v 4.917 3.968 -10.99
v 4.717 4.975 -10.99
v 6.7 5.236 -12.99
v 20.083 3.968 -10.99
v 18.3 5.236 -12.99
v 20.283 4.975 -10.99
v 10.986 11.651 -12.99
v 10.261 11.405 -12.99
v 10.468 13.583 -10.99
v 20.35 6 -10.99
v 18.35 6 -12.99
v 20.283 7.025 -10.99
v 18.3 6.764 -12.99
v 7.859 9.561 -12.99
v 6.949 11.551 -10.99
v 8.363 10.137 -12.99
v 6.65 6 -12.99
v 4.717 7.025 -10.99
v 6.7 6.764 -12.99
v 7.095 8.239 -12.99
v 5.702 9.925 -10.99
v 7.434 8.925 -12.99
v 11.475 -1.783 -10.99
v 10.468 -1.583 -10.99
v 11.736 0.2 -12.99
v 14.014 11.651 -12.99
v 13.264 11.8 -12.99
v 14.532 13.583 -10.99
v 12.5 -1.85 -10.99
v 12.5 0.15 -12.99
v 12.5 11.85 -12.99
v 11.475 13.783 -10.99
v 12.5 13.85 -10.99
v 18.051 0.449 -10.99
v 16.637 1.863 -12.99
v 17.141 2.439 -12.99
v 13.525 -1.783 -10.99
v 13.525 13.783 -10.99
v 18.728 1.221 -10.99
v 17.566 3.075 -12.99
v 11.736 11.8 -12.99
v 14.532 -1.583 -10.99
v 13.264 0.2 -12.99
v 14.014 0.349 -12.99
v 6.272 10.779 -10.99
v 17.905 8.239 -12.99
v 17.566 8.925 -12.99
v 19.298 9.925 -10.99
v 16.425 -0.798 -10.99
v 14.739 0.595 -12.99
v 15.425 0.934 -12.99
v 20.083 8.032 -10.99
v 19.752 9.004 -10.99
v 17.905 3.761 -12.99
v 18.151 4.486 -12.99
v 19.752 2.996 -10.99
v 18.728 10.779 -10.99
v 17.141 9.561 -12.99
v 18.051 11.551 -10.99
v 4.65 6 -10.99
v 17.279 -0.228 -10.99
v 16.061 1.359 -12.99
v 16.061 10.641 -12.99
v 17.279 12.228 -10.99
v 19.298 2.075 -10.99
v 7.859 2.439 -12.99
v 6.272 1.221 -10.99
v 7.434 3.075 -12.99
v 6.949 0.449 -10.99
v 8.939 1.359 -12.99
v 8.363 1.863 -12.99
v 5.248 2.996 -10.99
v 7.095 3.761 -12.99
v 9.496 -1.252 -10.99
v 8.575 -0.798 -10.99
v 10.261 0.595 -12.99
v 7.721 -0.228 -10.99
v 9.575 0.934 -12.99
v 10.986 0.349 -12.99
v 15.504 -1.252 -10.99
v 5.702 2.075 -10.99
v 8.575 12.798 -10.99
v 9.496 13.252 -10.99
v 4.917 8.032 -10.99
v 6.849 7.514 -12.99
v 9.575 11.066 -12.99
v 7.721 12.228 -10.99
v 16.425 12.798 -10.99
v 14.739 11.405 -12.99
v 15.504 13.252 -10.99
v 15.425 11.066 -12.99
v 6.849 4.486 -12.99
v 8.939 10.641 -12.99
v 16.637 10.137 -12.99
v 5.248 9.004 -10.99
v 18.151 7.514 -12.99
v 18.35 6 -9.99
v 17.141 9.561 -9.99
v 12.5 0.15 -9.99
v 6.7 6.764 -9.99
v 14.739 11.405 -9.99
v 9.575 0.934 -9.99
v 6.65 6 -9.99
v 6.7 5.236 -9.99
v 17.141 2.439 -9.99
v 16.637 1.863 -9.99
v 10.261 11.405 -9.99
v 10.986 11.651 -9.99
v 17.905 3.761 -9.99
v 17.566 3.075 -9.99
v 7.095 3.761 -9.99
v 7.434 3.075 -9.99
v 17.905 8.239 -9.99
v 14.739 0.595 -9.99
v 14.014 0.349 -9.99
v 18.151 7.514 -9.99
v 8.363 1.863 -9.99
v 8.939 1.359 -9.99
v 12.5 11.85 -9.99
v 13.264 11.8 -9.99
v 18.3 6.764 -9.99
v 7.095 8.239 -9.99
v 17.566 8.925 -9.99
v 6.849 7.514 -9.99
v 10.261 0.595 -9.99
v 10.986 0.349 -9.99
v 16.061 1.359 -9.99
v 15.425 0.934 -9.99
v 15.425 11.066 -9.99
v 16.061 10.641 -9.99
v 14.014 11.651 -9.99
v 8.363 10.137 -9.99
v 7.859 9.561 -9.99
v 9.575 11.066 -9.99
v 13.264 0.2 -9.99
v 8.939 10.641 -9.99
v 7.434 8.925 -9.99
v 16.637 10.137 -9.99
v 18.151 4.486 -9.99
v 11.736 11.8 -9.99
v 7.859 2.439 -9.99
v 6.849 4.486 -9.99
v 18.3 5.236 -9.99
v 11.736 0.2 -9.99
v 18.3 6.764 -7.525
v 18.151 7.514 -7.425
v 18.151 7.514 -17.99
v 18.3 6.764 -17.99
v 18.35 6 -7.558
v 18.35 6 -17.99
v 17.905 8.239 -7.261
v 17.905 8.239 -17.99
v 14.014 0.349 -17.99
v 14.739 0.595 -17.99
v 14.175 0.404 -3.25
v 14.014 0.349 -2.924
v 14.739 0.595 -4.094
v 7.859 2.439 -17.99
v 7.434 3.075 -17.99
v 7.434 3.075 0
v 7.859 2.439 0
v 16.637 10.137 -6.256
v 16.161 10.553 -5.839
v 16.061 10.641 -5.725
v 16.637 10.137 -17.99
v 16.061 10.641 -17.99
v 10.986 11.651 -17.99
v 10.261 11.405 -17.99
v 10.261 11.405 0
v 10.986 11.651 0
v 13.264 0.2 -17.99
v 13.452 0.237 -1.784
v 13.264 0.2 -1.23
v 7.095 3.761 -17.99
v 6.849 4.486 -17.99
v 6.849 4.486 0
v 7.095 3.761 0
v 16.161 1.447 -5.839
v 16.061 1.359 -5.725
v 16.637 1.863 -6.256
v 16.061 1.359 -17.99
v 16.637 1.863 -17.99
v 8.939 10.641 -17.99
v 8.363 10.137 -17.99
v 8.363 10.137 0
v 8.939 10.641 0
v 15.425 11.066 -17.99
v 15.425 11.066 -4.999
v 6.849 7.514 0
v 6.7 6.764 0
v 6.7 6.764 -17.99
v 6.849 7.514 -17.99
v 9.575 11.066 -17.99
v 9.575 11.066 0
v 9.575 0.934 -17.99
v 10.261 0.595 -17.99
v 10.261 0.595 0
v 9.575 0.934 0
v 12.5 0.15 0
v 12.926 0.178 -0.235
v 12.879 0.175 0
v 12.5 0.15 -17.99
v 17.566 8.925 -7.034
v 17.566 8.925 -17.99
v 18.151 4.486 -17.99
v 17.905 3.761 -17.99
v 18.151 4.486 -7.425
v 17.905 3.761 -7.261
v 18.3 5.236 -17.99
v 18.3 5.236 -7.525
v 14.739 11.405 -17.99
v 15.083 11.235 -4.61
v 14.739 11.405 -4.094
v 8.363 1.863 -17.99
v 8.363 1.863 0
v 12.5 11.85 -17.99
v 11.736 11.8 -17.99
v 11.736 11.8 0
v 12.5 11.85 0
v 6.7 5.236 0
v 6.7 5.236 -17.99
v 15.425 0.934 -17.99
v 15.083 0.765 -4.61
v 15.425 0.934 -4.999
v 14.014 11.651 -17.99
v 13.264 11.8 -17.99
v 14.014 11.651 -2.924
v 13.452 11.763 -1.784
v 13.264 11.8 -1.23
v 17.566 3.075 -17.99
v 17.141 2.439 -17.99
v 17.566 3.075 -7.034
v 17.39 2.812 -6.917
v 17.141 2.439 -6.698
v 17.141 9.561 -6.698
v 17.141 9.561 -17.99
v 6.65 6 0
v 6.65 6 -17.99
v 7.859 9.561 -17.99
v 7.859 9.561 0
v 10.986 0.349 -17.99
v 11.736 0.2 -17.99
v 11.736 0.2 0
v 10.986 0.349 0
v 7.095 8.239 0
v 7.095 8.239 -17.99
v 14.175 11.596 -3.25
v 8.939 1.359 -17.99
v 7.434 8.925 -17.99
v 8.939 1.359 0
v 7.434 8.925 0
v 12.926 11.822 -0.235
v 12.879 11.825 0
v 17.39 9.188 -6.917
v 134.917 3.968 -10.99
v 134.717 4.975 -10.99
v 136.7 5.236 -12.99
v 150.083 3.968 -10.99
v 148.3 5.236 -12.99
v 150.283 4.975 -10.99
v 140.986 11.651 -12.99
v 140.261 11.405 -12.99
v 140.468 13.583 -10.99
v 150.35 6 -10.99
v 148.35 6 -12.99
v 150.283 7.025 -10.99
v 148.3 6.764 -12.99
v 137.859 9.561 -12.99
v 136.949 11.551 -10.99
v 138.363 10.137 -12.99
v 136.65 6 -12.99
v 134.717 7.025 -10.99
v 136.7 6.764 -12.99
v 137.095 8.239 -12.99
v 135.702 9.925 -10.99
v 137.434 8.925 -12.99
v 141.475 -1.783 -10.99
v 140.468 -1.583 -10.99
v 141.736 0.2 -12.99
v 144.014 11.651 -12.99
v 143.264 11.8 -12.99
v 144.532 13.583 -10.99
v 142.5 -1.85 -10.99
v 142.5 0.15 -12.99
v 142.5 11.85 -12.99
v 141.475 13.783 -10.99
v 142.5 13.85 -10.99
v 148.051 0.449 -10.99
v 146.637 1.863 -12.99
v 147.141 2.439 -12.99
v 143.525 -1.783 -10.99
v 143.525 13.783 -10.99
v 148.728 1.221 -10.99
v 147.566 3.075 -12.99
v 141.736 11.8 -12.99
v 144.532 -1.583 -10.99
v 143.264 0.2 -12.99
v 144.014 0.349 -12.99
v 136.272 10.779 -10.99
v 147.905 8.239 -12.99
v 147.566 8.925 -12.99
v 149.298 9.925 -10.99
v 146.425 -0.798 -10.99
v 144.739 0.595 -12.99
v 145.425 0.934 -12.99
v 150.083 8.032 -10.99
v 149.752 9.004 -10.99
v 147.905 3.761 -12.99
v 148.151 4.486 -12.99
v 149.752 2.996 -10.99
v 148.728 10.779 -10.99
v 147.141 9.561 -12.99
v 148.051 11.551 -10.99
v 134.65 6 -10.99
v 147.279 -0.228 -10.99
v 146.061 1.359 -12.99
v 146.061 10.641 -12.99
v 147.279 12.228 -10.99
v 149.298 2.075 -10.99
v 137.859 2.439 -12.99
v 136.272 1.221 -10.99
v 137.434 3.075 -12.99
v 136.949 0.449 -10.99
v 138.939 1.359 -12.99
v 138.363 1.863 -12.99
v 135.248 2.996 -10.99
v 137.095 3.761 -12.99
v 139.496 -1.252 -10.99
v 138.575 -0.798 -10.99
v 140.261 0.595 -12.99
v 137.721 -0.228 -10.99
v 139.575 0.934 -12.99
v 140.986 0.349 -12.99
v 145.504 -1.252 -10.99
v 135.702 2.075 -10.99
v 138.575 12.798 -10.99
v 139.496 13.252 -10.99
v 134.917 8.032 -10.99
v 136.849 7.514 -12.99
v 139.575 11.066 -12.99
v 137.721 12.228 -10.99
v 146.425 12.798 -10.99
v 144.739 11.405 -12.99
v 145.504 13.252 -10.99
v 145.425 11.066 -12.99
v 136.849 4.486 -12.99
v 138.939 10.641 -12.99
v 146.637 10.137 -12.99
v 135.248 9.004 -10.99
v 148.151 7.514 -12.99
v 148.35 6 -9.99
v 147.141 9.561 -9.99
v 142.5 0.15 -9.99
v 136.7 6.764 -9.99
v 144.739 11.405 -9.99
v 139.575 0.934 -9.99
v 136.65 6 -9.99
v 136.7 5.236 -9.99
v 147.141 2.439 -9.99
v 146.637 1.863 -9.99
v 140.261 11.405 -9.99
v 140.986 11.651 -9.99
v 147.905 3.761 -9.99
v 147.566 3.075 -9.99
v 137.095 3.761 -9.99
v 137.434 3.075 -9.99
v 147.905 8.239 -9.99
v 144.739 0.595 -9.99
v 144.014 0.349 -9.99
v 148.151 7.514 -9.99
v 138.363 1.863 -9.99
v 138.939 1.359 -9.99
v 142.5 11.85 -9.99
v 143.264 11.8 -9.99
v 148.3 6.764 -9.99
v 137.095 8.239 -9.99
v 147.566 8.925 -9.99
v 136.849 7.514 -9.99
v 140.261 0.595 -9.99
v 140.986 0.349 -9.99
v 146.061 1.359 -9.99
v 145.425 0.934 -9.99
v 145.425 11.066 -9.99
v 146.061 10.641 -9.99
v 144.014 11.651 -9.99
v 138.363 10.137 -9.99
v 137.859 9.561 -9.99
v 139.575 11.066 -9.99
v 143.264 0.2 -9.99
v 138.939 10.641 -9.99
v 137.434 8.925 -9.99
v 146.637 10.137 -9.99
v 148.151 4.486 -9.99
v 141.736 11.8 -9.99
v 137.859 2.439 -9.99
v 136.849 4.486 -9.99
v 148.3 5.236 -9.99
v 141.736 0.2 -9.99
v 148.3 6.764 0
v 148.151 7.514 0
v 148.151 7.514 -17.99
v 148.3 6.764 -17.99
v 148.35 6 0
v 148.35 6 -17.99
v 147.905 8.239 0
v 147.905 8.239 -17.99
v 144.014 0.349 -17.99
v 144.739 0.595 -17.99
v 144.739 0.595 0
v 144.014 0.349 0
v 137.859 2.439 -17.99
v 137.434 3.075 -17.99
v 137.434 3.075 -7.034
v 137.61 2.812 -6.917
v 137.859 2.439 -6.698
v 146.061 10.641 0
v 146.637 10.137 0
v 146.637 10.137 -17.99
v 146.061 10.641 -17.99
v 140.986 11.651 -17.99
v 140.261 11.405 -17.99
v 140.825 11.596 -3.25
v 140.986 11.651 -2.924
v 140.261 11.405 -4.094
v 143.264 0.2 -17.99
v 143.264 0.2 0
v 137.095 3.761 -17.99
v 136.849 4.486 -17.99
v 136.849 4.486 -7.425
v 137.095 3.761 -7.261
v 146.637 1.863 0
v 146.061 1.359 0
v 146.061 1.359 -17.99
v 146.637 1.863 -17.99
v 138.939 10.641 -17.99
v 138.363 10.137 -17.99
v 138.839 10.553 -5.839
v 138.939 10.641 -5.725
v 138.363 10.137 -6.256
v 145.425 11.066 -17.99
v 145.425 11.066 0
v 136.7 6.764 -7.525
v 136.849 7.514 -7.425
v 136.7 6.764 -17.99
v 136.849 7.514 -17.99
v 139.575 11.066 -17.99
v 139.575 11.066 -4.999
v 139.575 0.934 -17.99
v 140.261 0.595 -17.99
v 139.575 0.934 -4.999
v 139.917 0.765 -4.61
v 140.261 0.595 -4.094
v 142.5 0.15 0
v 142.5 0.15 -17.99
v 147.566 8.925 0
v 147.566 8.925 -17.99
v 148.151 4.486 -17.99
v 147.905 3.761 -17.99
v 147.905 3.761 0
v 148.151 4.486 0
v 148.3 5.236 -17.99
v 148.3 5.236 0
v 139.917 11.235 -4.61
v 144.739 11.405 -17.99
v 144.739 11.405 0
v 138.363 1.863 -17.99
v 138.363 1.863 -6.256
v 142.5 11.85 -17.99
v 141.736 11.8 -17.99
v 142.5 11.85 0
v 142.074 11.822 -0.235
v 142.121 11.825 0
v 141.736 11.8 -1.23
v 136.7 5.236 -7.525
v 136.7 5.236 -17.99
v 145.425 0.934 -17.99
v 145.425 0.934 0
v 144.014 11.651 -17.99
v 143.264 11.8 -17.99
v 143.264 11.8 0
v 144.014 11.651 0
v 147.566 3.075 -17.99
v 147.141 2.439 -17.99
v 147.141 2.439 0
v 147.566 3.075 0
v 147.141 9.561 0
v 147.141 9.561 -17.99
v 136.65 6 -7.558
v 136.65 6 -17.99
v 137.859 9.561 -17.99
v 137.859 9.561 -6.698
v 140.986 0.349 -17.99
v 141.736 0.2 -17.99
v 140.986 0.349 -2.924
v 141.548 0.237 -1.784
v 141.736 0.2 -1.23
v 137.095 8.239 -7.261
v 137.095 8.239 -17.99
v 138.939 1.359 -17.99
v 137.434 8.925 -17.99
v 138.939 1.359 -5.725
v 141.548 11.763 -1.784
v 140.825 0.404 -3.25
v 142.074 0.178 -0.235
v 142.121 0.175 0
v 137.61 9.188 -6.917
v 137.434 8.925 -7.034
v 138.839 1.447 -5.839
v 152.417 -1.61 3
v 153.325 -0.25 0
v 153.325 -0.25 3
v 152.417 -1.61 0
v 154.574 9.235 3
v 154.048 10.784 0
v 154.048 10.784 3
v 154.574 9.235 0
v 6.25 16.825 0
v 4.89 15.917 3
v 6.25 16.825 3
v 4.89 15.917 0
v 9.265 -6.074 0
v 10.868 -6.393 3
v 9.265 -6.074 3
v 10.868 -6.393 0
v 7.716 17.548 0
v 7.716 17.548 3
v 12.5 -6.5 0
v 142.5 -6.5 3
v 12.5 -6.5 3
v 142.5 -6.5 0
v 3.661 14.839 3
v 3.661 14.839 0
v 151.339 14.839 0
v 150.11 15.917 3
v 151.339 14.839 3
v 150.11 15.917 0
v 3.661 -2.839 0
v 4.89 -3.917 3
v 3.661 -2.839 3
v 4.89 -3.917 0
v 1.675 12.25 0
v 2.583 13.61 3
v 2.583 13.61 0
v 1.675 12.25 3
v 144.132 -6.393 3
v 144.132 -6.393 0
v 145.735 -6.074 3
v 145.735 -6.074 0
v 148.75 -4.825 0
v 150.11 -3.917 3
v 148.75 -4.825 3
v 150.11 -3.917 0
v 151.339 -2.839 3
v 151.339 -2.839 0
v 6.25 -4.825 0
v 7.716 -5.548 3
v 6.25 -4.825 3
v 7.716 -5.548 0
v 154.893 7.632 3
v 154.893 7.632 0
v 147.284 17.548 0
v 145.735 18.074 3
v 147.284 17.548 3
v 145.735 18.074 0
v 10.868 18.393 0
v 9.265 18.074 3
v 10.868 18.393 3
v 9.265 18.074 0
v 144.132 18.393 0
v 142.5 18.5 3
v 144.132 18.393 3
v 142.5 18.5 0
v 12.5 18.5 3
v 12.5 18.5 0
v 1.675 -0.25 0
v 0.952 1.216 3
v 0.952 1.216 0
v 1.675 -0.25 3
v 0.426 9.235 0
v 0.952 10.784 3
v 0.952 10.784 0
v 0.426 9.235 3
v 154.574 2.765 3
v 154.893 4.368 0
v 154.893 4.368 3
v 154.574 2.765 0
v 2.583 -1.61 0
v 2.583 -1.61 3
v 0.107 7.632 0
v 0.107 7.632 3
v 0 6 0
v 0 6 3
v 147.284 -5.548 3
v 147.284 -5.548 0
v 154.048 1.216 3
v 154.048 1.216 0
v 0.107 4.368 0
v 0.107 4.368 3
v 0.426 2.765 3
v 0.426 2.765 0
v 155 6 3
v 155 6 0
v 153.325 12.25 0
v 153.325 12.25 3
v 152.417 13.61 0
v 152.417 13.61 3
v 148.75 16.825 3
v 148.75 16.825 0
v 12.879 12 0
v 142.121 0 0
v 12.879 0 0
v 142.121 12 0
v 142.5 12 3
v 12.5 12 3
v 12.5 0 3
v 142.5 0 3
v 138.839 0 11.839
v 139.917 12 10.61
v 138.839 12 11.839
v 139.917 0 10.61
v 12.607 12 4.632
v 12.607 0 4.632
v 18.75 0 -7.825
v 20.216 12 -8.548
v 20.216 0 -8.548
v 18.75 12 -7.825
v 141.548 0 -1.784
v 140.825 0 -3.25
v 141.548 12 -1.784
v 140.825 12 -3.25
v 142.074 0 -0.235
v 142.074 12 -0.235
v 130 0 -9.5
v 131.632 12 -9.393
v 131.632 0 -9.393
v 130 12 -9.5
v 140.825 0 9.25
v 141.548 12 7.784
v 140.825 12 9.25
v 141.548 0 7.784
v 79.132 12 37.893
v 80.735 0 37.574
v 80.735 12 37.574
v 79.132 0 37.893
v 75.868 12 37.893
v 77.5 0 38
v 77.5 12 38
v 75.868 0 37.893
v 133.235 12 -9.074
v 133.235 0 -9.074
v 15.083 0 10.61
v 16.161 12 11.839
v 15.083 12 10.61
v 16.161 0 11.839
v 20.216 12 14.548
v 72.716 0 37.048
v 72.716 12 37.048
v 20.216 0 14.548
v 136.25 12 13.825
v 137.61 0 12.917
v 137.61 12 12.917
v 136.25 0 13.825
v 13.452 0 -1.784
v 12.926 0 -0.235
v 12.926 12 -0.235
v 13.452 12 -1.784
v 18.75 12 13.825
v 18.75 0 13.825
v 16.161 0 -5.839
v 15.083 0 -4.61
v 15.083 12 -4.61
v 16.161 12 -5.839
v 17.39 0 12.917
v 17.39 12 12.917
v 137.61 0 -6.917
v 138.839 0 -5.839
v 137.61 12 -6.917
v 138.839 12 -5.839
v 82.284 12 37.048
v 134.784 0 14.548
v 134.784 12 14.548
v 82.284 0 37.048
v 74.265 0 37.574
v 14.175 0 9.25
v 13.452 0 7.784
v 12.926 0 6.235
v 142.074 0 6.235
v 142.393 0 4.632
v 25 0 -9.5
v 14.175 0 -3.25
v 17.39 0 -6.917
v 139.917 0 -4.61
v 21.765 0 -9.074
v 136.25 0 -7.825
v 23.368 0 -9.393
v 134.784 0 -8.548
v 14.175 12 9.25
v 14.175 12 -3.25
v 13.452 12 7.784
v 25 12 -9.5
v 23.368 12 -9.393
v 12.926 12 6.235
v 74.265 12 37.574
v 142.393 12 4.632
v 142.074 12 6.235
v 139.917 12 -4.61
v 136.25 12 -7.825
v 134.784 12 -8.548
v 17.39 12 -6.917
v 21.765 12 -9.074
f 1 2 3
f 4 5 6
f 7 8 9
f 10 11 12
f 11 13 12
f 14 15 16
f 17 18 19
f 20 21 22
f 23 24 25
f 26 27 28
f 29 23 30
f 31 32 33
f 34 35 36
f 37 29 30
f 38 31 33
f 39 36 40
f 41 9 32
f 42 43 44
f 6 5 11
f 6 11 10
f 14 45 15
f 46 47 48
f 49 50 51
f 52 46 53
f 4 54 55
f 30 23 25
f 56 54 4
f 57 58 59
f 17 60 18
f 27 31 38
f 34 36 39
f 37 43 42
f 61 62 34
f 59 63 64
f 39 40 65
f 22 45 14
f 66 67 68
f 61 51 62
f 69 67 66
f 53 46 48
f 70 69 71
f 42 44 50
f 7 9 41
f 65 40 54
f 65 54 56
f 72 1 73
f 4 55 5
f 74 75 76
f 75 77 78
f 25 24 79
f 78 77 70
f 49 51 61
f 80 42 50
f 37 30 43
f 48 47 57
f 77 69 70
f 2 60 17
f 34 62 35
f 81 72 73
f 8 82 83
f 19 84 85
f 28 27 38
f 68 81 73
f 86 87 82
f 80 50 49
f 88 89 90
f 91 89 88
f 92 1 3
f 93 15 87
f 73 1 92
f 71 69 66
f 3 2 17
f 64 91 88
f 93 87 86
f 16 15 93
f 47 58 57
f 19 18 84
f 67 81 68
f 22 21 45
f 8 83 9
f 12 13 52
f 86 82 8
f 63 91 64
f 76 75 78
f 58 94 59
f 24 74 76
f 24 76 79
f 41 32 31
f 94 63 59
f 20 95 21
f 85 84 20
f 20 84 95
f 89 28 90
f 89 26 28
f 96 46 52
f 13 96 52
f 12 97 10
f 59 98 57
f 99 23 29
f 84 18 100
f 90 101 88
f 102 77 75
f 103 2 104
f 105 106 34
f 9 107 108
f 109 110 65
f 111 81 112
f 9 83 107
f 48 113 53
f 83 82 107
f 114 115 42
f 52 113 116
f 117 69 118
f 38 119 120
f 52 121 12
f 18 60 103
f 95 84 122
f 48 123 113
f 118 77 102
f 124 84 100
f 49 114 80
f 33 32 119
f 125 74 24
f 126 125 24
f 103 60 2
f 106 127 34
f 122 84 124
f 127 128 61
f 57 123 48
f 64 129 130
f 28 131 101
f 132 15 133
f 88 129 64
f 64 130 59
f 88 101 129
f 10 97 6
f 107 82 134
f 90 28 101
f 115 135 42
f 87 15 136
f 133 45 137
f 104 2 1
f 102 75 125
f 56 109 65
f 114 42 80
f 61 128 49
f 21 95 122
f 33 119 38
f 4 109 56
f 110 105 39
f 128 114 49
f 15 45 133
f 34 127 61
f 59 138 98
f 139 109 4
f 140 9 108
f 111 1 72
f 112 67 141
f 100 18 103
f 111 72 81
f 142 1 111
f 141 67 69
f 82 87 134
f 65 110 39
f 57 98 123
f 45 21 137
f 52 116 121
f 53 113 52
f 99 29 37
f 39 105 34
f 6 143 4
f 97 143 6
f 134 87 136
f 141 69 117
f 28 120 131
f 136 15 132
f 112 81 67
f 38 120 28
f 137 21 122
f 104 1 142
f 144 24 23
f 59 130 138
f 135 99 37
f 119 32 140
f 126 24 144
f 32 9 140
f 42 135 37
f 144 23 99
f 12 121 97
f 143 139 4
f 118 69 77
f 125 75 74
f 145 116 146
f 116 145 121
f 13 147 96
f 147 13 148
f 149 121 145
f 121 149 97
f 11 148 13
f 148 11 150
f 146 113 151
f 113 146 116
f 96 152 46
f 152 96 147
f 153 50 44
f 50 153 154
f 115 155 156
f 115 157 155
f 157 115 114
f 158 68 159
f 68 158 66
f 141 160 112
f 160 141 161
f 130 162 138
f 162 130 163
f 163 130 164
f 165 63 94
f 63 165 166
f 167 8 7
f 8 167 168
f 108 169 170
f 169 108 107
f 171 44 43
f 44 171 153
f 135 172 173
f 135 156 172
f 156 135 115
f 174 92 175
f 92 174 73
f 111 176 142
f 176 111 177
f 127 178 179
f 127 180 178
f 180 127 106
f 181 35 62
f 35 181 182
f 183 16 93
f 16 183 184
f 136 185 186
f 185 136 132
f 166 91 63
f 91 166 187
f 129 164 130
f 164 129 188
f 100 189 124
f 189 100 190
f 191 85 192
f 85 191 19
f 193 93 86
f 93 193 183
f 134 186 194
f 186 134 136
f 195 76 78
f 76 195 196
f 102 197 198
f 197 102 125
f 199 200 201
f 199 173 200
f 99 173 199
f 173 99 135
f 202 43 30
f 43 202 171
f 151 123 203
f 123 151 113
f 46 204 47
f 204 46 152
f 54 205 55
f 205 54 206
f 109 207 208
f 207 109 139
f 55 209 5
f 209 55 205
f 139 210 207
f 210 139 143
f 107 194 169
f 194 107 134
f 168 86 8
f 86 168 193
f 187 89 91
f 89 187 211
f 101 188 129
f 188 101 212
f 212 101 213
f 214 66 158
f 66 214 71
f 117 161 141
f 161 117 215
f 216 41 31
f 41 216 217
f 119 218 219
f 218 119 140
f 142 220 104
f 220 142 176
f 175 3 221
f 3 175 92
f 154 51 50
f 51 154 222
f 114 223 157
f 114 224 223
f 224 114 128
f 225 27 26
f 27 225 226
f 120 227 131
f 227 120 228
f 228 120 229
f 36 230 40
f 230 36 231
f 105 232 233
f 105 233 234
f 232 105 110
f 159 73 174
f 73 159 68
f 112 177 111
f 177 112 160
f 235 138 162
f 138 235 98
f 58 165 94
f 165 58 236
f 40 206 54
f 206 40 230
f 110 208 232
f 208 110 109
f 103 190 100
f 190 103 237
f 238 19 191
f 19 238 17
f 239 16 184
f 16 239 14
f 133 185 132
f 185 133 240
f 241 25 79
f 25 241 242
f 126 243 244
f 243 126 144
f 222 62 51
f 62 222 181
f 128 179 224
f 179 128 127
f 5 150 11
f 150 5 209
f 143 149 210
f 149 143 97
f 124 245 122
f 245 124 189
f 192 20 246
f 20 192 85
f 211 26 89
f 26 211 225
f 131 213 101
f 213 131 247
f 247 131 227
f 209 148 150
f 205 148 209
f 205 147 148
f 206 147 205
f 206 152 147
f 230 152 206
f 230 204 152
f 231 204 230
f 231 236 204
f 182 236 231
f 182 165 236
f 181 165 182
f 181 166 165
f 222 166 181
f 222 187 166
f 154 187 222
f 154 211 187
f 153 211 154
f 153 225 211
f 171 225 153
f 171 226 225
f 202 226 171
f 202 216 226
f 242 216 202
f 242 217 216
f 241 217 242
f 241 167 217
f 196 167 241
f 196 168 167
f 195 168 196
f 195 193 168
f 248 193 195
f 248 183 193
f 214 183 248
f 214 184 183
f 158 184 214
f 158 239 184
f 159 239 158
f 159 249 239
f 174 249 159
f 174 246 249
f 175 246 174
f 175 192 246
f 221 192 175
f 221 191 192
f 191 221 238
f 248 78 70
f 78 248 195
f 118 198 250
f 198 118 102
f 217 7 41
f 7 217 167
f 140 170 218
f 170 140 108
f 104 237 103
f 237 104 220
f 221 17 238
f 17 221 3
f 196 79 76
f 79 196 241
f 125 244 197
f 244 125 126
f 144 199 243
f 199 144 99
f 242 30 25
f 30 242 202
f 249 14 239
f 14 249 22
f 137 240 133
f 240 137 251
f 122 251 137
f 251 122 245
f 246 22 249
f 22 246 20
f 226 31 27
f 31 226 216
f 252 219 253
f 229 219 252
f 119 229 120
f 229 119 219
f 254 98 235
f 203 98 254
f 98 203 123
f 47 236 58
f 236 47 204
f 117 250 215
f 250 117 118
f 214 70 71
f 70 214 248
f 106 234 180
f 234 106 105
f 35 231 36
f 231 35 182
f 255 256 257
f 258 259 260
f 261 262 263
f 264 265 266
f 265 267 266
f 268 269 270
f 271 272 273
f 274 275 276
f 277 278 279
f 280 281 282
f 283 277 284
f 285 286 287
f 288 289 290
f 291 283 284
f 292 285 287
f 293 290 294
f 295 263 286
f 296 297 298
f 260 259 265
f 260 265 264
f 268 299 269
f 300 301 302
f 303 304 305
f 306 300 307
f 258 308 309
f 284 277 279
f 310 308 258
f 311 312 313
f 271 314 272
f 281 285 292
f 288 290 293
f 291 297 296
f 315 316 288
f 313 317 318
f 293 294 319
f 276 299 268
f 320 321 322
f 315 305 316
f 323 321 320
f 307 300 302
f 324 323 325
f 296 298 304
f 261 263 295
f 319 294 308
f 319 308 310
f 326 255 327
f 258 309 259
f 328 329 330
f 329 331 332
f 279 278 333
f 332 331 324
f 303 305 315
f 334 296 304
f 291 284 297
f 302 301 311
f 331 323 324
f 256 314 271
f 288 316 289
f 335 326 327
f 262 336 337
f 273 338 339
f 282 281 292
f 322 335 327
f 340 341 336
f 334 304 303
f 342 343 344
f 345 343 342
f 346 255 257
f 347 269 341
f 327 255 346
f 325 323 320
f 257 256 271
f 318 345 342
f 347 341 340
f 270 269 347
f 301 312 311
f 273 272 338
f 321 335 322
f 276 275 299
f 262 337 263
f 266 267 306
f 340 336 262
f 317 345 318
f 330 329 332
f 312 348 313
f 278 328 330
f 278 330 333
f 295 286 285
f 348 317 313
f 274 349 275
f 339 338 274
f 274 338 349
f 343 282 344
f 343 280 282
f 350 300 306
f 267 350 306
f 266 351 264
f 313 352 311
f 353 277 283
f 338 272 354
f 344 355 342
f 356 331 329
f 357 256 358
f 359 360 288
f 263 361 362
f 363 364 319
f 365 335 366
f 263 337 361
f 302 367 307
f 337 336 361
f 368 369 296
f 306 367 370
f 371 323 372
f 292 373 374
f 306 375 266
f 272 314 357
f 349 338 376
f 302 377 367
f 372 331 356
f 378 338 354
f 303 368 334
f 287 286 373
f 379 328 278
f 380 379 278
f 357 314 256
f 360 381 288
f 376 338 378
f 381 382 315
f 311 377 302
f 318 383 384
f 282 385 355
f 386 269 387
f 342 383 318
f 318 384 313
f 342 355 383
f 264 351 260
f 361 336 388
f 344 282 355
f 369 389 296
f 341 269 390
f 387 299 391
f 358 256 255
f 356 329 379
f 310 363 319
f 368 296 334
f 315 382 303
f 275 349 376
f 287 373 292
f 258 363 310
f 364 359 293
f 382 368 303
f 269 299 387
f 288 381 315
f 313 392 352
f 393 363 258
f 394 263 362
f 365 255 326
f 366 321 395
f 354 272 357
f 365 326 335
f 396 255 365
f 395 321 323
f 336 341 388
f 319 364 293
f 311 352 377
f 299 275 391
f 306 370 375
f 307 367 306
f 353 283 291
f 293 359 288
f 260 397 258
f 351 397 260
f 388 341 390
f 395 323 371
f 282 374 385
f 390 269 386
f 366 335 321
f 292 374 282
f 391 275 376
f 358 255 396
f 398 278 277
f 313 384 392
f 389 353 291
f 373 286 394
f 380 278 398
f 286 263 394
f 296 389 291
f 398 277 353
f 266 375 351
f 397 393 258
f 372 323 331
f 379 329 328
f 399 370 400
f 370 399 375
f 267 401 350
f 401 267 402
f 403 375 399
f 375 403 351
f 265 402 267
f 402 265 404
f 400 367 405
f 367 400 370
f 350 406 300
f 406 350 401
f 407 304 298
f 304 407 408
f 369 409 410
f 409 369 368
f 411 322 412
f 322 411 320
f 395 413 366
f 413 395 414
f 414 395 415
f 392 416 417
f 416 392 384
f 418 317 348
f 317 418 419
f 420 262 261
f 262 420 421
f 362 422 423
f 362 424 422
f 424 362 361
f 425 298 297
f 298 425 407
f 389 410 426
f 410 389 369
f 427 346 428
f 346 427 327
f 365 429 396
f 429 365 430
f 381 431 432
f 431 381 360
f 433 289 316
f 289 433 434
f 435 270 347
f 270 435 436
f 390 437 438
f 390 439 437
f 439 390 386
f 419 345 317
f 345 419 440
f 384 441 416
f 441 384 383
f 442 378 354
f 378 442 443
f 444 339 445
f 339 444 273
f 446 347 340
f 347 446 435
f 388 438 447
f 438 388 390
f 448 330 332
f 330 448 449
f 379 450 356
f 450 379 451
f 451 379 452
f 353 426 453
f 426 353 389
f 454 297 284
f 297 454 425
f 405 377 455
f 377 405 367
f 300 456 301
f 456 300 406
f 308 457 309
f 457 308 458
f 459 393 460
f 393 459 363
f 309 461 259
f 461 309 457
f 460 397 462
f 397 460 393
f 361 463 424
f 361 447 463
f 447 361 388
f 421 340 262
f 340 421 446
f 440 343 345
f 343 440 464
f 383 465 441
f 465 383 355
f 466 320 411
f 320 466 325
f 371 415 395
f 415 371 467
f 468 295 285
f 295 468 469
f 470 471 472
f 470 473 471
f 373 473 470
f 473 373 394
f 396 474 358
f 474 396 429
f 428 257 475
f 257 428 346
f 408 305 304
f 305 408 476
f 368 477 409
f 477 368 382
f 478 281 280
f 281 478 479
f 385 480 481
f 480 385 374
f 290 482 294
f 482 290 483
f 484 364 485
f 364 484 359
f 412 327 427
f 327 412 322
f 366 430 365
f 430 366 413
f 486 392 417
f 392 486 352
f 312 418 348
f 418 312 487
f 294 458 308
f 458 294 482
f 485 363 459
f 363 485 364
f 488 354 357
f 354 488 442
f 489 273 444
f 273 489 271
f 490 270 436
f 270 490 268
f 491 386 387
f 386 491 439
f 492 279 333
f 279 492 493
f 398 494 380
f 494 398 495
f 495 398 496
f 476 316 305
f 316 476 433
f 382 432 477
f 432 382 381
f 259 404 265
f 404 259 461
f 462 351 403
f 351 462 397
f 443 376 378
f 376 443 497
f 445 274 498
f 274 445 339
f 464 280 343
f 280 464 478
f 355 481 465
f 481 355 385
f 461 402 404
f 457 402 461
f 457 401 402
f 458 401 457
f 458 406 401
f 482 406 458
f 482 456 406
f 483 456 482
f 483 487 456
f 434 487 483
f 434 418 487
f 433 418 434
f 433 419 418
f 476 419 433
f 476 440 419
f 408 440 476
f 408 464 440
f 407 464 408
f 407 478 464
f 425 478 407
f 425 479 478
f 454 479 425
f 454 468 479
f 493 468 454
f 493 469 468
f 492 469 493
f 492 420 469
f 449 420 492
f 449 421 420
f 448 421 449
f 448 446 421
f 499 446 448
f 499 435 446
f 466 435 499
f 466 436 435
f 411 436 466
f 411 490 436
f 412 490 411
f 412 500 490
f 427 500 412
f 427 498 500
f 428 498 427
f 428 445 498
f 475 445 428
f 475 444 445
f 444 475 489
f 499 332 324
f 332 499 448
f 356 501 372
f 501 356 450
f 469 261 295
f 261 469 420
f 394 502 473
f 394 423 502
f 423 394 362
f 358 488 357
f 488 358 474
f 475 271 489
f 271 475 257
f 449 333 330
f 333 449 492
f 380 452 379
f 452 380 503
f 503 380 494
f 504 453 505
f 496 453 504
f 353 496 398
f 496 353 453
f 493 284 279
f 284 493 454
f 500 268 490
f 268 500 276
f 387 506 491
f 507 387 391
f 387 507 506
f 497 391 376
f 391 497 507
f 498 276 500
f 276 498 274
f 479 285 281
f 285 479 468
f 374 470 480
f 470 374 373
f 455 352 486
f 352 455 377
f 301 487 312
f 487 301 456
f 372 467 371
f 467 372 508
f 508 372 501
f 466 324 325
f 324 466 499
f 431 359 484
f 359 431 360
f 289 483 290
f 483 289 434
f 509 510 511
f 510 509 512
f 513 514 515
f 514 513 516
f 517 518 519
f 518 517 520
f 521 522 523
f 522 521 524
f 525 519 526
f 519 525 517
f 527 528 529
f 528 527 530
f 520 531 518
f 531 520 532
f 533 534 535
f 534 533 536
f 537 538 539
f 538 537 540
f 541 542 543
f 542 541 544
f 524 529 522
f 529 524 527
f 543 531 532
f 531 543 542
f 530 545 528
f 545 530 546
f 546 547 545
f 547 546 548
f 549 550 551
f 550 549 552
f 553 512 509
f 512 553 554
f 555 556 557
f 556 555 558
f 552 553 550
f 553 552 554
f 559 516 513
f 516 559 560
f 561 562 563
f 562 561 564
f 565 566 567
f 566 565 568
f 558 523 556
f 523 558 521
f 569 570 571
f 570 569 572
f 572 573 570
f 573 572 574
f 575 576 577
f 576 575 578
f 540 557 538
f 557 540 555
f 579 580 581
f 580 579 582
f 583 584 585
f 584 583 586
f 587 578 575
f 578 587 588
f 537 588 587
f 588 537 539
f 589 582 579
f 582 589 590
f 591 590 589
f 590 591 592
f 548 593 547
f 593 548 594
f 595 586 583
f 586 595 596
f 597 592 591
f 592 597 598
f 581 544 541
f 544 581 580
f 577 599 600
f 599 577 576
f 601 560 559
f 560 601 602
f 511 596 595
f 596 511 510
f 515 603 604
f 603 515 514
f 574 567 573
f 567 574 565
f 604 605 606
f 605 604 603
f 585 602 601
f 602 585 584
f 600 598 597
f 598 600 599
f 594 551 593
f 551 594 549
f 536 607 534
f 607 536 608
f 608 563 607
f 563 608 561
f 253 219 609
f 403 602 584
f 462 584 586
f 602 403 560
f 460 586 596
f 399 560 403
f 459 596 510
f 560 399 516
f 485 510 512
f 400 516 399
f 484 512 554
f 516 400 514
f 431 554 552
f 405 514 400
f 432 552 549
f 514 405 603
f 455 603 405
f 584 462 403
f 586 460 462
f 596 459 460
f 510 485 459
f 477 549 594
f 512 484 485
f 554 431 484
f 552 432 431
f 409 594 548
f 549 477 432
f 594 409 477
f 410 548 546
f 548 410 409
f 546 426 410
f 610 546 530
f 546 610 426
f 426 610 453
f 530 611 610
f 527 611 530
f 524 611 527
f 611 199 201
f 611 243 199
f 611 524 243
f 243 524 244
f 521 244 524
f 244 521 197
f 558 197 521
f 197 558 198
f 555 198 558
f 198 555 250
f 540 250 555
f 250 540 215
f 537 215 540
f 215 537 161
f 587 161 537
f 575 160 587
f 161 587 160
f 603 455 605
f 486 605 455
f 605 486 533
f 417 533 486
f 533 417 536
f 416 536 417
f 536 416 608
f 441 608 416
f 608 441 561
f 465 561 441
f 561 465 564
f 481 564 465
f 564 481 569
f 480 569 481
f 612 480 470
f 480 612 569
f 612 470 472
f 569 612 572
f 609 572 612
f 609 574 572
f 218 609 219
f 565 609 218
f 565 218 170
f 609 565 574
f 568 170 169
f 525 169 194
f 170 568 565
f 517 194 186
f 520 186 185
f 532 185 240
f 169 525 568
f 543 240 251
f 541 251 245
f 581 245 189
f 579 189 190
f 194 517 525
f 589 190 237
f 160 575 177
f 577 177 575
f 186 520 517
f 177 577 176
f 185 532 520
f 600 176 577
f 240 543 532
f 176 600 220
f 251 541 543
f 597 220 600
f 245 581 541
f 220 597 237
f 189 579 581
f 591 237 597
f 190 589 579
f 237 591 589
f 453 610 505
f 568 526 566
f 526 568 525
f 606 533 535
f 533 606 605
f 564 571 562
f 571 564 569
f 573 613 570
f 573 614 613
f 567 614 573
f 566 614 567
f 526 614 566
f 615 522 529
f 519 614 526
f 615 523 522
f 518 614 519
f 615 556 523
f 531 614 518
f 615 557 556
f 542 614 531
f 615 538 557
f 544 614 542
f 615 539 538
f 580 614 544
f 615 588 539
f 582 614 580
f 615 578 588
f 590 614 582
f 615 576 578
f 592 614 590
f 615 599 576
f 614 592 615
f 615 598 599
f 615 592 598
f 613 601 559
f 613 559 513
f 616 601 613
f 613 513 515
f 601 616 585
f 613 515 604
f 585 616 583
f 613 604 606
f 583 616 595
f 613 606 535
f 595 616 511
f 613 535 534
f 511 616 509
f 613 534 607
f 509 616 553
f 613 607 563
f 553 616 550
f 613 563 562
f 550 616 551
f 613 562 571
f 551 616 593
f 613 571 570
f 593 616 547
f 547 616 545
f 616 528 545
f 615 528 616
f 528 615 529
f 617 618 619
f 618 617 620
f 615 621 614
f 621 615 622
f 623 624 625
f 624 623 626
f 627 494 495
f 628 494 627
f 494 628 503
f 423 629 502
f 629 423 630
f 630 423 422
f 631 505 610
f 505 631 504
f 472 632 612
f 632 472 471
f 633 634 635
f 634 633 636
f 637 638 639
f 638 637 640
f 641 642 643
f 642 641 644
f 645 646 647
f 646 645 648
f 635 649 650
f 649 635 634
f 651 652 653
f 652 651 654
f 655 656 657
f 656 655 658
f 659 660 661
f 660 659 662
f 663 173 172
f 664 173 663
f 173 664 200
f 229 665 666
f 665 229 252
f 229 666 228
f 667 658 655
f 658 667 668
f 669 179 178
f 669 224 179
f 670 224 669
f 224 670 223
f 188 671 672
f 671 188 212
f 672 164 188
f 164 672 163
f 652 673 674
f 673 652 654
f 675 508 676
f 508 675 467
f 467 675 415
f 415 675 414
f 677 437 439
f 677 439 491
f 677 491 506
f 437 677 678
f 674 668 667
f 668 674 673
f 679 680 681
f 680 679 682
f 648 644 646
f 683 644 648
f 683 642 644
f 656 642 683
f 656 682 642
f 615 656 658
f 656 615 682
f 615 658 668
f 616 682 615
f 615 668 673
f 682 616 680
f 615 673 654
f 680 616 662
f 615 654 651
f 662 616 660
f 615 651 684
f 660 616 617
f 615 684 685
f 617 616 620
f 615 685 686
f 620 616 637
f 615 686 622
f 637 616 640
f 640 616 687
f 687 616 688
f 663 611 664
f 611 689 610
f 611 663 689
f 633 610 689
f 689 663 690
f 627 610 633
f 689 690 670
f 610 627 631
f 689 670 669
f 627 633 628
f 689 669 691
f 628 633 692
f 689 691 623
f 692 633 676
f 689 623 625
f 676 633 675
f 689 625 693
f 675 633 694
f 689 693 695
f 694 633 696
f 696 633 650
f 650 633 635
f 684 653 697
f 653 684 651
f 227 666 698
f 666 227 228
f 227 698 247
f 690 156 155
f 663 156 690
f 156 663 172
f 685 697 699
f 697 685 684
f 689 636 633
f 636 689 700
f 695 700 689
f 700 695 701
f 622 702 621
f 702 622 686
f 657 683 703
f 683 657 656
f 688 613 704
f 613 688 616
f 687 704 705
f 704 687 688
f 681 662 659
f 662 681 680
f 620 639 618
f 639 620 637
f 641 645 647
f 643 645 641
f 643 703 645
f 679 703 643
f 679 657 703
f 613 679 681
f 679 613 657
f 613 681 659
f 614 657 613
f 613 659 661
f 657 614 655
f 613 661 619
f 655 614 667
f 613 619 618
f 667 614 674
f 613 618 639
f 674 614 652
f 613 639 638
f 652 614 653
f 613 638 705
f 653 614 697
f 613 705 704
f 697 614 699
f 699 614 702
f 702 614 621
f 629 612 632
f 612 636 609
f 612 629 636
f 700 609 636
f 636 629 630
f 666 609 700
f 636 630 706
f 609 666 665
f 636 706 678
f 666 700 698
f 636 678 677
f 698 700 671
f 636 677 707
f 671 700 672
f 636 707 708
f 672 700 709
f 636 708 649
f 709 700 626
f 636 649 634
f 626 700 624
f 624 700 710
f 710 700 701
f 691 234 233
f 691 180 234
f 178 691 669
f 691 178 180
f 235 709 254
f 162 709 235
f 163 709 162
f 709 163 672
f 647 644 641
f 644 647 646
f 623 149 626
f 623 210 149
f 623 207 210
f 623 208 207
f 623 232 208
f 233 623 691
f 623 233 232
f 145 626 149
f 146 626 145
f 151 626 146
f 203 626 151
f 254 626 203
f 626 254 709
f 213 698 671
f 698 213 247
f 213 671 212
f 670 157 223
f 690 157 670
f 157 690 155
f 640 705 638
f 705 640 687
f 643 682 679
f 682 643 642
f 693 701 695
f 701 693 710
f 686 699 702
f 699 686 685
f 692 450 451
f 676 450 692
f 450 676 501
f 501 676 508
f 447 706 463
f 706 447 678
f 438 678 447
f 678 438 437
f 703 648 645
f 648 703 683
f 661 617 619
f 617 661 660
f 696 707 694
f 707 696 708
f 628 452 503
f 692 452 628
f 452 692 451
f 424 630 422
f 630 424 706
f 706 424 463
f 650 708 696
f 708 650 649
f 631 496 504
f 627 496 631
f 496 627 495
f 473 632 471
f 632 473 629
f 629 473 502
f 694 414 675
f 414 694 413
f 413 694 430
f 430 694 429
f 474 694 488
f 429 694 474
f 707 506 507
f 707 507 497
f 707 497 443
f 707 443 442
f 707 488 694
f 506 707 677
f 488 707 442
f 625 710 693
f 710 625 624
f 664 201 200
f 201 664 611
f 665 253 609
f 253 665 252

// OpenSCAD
// Laundry Basket Handle
// Through-hole mount with snap-fit retention
// PRINT: Flat on bed, handle arch facing up. Supports needed for the arch.

/* [Mounting - Measure Your Basket] */
hole_diameter = 12;      // Diameter of holes in basket (mm)
hole_spacing = 130;      // Center-to-center distance between holes (mm)
rim_thickness = 4;       // Thickness of basket rim/wall (mm)

/* [Handle Dimensions] */
grip_height = 35;        // How high the handle rises above the rim
grip_width = 25;         // Width of the grip section
grip_thickness = 12;     // Thickness of grip (front to back)

/* [Pin Settings] */
pin_length = 18;         // Total length of mounting pin
pin_clearance = 0.3;     // Gap for fit (increase if too tight)
barb_height = 2;         // Height of retention barb
barb_angle = 45;         // Angle of barb slope

/* [Print Settings] */
wall = 3;                // Structural wall thickness
$fn = 48;

// Derived dimensions
pin_diameter = hole_diameter - pin_clearance;
base_width = hole_spacing + grip_width;
base_depth = grip_thickness;
base_height = wall;

// Main assembly
union() {
    // Base plate that sits against the basket
    base_plate();

    // Mounting pins with retention barbs
    translate([grip_width/2, base_depth/2, -pin_length + 0.01])
        mounting_pin();
    translate([base_width - grip_width/2, base_depth/2, -pin_length + 0.01])
        mounting_pin();

    // Handle arch
    translate([base_width/2, base_depth/2, base_height])
        handle_arch();
}

module base_plate() {
    // Rounded rectangular base
    hull() {
        for (x = [grip_width/2, base_width - grip_width/2])
            translate([x, base_depth/2, 0])
                cylinder(d=grip_width, h=base_height);
    }
}

module mounting_pin() {
    // Main pin shaft
    cylinder(d=pin_diameter, h=pin_length);

    // Retention barb ring at the bottom
    translate([0, 0, 0])
        barb_ring();

    // Chamfer at tip for easy insertion
    translate([0, 0, 0])
        cylinder(d1=pin_diameter - 2, d2=pin_diameter, h=2);
}

module barb_ring() {
    // Angled barb that snaps past the hole
    barb_diameter = pin_diameter + barb_height * 2;

    translate([0, 0, rim_thickness + 1]) {
        // Sloped entry side
        cylinder(d1=pin_diameter, d2=barb_diameter, h=barb_height);
        // Flat retention side
        translate([0, 0, barb_height])
            cylinder(d1=barb_diameter, d2=pin_diameter, h=barb_height/2);
    }
}

module handle_arch() {
    // Ergonomic arch handle
    arch_length = hole_spacing - grip_width;

    // Create arch profile and sweep it
    rotate([90, 0, 0])
    linear_extrude(height=grip_thickness, center=true)
        handle_profile(arch_length, grip_height, grip_width);
}

module handle_profile(length, height, width) {
    // 2D profile of the handle arch
    r = width / 2;

    hull() {
        // Left mounting point
        translate([-length/2, 0])
            circle(d=width);
        // Right mounting point
        translate([length/2, 0])
            circle(d=width);
        // Top of arch
        translate([0, height - r])
            circle(d=width);
    }
}

// Print info
echo(str("Handle spans: ", base_width, "mm"));
echo(str("Pin diameter: ", pin_diameter, "mm (for ", hole_diameter, "mm holes)"));
echo(str("Grip height above rim: ", grip_height, "mm"));
echo(str("Recommend printing with supports for the arch"));
